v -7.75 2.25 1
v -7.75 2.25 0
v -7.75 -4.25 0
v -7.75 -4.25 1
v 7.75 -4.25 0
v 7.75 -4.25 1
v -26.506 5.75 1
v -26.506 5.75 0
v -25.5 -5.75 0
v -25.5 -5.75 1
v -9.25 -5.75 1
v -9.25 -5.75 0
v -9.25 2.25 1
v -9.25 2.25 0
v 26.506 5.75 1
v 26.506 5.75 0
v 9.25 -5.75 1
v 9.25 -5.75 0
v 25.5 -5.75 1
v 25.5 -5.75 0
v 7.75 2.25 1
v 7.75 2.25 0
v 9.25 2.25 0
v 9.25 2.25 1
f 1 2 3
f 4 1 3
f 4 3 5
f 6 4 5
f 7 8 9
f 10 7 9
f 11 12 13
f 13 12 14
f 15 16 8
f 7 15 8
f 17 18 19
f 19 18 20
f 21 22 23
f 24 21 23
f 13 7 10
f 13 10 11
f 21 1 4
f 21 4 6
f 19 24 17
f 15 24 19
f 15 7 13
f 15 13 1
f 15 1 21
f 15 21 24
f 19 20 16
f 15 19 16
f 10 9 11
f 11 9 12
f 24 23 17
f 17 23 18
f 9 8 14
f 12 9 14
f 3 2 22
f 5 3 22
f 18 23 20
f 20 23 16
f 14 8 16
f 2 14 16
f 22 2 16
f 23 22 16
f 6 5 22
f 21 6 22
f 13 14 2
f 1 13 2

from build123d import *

# Parameters (mm, degrees)
F1_DEPTH = 1


with BuildPart() as f1:
    # F0 (on Top) → F1 (new body)
    with BuildSketch(Plane.XY):
        Polygon((-25.5, -5.75), (-25.5, 5.75), (-26.50612, 5.75), align=None)
        Polygon((25.5, 5.75), (-25.5, 5.75), (-25.5, -5.75), (-9.25, -5.75), (-9.25, 2.25), (-7.75, 2.25), (-7.75, -4.25), (7.75, -4.25), (7.75, 2.25), (9.25, 2.25), (9.25, -5.75), (25.5, -5.75), align=None)
        Polygon((26.50612, 5.75), (25.5, 5.75), (25.5, -5.75), align=None)
    extrude(amount=F1_DEPTH)


solid = f1.part
